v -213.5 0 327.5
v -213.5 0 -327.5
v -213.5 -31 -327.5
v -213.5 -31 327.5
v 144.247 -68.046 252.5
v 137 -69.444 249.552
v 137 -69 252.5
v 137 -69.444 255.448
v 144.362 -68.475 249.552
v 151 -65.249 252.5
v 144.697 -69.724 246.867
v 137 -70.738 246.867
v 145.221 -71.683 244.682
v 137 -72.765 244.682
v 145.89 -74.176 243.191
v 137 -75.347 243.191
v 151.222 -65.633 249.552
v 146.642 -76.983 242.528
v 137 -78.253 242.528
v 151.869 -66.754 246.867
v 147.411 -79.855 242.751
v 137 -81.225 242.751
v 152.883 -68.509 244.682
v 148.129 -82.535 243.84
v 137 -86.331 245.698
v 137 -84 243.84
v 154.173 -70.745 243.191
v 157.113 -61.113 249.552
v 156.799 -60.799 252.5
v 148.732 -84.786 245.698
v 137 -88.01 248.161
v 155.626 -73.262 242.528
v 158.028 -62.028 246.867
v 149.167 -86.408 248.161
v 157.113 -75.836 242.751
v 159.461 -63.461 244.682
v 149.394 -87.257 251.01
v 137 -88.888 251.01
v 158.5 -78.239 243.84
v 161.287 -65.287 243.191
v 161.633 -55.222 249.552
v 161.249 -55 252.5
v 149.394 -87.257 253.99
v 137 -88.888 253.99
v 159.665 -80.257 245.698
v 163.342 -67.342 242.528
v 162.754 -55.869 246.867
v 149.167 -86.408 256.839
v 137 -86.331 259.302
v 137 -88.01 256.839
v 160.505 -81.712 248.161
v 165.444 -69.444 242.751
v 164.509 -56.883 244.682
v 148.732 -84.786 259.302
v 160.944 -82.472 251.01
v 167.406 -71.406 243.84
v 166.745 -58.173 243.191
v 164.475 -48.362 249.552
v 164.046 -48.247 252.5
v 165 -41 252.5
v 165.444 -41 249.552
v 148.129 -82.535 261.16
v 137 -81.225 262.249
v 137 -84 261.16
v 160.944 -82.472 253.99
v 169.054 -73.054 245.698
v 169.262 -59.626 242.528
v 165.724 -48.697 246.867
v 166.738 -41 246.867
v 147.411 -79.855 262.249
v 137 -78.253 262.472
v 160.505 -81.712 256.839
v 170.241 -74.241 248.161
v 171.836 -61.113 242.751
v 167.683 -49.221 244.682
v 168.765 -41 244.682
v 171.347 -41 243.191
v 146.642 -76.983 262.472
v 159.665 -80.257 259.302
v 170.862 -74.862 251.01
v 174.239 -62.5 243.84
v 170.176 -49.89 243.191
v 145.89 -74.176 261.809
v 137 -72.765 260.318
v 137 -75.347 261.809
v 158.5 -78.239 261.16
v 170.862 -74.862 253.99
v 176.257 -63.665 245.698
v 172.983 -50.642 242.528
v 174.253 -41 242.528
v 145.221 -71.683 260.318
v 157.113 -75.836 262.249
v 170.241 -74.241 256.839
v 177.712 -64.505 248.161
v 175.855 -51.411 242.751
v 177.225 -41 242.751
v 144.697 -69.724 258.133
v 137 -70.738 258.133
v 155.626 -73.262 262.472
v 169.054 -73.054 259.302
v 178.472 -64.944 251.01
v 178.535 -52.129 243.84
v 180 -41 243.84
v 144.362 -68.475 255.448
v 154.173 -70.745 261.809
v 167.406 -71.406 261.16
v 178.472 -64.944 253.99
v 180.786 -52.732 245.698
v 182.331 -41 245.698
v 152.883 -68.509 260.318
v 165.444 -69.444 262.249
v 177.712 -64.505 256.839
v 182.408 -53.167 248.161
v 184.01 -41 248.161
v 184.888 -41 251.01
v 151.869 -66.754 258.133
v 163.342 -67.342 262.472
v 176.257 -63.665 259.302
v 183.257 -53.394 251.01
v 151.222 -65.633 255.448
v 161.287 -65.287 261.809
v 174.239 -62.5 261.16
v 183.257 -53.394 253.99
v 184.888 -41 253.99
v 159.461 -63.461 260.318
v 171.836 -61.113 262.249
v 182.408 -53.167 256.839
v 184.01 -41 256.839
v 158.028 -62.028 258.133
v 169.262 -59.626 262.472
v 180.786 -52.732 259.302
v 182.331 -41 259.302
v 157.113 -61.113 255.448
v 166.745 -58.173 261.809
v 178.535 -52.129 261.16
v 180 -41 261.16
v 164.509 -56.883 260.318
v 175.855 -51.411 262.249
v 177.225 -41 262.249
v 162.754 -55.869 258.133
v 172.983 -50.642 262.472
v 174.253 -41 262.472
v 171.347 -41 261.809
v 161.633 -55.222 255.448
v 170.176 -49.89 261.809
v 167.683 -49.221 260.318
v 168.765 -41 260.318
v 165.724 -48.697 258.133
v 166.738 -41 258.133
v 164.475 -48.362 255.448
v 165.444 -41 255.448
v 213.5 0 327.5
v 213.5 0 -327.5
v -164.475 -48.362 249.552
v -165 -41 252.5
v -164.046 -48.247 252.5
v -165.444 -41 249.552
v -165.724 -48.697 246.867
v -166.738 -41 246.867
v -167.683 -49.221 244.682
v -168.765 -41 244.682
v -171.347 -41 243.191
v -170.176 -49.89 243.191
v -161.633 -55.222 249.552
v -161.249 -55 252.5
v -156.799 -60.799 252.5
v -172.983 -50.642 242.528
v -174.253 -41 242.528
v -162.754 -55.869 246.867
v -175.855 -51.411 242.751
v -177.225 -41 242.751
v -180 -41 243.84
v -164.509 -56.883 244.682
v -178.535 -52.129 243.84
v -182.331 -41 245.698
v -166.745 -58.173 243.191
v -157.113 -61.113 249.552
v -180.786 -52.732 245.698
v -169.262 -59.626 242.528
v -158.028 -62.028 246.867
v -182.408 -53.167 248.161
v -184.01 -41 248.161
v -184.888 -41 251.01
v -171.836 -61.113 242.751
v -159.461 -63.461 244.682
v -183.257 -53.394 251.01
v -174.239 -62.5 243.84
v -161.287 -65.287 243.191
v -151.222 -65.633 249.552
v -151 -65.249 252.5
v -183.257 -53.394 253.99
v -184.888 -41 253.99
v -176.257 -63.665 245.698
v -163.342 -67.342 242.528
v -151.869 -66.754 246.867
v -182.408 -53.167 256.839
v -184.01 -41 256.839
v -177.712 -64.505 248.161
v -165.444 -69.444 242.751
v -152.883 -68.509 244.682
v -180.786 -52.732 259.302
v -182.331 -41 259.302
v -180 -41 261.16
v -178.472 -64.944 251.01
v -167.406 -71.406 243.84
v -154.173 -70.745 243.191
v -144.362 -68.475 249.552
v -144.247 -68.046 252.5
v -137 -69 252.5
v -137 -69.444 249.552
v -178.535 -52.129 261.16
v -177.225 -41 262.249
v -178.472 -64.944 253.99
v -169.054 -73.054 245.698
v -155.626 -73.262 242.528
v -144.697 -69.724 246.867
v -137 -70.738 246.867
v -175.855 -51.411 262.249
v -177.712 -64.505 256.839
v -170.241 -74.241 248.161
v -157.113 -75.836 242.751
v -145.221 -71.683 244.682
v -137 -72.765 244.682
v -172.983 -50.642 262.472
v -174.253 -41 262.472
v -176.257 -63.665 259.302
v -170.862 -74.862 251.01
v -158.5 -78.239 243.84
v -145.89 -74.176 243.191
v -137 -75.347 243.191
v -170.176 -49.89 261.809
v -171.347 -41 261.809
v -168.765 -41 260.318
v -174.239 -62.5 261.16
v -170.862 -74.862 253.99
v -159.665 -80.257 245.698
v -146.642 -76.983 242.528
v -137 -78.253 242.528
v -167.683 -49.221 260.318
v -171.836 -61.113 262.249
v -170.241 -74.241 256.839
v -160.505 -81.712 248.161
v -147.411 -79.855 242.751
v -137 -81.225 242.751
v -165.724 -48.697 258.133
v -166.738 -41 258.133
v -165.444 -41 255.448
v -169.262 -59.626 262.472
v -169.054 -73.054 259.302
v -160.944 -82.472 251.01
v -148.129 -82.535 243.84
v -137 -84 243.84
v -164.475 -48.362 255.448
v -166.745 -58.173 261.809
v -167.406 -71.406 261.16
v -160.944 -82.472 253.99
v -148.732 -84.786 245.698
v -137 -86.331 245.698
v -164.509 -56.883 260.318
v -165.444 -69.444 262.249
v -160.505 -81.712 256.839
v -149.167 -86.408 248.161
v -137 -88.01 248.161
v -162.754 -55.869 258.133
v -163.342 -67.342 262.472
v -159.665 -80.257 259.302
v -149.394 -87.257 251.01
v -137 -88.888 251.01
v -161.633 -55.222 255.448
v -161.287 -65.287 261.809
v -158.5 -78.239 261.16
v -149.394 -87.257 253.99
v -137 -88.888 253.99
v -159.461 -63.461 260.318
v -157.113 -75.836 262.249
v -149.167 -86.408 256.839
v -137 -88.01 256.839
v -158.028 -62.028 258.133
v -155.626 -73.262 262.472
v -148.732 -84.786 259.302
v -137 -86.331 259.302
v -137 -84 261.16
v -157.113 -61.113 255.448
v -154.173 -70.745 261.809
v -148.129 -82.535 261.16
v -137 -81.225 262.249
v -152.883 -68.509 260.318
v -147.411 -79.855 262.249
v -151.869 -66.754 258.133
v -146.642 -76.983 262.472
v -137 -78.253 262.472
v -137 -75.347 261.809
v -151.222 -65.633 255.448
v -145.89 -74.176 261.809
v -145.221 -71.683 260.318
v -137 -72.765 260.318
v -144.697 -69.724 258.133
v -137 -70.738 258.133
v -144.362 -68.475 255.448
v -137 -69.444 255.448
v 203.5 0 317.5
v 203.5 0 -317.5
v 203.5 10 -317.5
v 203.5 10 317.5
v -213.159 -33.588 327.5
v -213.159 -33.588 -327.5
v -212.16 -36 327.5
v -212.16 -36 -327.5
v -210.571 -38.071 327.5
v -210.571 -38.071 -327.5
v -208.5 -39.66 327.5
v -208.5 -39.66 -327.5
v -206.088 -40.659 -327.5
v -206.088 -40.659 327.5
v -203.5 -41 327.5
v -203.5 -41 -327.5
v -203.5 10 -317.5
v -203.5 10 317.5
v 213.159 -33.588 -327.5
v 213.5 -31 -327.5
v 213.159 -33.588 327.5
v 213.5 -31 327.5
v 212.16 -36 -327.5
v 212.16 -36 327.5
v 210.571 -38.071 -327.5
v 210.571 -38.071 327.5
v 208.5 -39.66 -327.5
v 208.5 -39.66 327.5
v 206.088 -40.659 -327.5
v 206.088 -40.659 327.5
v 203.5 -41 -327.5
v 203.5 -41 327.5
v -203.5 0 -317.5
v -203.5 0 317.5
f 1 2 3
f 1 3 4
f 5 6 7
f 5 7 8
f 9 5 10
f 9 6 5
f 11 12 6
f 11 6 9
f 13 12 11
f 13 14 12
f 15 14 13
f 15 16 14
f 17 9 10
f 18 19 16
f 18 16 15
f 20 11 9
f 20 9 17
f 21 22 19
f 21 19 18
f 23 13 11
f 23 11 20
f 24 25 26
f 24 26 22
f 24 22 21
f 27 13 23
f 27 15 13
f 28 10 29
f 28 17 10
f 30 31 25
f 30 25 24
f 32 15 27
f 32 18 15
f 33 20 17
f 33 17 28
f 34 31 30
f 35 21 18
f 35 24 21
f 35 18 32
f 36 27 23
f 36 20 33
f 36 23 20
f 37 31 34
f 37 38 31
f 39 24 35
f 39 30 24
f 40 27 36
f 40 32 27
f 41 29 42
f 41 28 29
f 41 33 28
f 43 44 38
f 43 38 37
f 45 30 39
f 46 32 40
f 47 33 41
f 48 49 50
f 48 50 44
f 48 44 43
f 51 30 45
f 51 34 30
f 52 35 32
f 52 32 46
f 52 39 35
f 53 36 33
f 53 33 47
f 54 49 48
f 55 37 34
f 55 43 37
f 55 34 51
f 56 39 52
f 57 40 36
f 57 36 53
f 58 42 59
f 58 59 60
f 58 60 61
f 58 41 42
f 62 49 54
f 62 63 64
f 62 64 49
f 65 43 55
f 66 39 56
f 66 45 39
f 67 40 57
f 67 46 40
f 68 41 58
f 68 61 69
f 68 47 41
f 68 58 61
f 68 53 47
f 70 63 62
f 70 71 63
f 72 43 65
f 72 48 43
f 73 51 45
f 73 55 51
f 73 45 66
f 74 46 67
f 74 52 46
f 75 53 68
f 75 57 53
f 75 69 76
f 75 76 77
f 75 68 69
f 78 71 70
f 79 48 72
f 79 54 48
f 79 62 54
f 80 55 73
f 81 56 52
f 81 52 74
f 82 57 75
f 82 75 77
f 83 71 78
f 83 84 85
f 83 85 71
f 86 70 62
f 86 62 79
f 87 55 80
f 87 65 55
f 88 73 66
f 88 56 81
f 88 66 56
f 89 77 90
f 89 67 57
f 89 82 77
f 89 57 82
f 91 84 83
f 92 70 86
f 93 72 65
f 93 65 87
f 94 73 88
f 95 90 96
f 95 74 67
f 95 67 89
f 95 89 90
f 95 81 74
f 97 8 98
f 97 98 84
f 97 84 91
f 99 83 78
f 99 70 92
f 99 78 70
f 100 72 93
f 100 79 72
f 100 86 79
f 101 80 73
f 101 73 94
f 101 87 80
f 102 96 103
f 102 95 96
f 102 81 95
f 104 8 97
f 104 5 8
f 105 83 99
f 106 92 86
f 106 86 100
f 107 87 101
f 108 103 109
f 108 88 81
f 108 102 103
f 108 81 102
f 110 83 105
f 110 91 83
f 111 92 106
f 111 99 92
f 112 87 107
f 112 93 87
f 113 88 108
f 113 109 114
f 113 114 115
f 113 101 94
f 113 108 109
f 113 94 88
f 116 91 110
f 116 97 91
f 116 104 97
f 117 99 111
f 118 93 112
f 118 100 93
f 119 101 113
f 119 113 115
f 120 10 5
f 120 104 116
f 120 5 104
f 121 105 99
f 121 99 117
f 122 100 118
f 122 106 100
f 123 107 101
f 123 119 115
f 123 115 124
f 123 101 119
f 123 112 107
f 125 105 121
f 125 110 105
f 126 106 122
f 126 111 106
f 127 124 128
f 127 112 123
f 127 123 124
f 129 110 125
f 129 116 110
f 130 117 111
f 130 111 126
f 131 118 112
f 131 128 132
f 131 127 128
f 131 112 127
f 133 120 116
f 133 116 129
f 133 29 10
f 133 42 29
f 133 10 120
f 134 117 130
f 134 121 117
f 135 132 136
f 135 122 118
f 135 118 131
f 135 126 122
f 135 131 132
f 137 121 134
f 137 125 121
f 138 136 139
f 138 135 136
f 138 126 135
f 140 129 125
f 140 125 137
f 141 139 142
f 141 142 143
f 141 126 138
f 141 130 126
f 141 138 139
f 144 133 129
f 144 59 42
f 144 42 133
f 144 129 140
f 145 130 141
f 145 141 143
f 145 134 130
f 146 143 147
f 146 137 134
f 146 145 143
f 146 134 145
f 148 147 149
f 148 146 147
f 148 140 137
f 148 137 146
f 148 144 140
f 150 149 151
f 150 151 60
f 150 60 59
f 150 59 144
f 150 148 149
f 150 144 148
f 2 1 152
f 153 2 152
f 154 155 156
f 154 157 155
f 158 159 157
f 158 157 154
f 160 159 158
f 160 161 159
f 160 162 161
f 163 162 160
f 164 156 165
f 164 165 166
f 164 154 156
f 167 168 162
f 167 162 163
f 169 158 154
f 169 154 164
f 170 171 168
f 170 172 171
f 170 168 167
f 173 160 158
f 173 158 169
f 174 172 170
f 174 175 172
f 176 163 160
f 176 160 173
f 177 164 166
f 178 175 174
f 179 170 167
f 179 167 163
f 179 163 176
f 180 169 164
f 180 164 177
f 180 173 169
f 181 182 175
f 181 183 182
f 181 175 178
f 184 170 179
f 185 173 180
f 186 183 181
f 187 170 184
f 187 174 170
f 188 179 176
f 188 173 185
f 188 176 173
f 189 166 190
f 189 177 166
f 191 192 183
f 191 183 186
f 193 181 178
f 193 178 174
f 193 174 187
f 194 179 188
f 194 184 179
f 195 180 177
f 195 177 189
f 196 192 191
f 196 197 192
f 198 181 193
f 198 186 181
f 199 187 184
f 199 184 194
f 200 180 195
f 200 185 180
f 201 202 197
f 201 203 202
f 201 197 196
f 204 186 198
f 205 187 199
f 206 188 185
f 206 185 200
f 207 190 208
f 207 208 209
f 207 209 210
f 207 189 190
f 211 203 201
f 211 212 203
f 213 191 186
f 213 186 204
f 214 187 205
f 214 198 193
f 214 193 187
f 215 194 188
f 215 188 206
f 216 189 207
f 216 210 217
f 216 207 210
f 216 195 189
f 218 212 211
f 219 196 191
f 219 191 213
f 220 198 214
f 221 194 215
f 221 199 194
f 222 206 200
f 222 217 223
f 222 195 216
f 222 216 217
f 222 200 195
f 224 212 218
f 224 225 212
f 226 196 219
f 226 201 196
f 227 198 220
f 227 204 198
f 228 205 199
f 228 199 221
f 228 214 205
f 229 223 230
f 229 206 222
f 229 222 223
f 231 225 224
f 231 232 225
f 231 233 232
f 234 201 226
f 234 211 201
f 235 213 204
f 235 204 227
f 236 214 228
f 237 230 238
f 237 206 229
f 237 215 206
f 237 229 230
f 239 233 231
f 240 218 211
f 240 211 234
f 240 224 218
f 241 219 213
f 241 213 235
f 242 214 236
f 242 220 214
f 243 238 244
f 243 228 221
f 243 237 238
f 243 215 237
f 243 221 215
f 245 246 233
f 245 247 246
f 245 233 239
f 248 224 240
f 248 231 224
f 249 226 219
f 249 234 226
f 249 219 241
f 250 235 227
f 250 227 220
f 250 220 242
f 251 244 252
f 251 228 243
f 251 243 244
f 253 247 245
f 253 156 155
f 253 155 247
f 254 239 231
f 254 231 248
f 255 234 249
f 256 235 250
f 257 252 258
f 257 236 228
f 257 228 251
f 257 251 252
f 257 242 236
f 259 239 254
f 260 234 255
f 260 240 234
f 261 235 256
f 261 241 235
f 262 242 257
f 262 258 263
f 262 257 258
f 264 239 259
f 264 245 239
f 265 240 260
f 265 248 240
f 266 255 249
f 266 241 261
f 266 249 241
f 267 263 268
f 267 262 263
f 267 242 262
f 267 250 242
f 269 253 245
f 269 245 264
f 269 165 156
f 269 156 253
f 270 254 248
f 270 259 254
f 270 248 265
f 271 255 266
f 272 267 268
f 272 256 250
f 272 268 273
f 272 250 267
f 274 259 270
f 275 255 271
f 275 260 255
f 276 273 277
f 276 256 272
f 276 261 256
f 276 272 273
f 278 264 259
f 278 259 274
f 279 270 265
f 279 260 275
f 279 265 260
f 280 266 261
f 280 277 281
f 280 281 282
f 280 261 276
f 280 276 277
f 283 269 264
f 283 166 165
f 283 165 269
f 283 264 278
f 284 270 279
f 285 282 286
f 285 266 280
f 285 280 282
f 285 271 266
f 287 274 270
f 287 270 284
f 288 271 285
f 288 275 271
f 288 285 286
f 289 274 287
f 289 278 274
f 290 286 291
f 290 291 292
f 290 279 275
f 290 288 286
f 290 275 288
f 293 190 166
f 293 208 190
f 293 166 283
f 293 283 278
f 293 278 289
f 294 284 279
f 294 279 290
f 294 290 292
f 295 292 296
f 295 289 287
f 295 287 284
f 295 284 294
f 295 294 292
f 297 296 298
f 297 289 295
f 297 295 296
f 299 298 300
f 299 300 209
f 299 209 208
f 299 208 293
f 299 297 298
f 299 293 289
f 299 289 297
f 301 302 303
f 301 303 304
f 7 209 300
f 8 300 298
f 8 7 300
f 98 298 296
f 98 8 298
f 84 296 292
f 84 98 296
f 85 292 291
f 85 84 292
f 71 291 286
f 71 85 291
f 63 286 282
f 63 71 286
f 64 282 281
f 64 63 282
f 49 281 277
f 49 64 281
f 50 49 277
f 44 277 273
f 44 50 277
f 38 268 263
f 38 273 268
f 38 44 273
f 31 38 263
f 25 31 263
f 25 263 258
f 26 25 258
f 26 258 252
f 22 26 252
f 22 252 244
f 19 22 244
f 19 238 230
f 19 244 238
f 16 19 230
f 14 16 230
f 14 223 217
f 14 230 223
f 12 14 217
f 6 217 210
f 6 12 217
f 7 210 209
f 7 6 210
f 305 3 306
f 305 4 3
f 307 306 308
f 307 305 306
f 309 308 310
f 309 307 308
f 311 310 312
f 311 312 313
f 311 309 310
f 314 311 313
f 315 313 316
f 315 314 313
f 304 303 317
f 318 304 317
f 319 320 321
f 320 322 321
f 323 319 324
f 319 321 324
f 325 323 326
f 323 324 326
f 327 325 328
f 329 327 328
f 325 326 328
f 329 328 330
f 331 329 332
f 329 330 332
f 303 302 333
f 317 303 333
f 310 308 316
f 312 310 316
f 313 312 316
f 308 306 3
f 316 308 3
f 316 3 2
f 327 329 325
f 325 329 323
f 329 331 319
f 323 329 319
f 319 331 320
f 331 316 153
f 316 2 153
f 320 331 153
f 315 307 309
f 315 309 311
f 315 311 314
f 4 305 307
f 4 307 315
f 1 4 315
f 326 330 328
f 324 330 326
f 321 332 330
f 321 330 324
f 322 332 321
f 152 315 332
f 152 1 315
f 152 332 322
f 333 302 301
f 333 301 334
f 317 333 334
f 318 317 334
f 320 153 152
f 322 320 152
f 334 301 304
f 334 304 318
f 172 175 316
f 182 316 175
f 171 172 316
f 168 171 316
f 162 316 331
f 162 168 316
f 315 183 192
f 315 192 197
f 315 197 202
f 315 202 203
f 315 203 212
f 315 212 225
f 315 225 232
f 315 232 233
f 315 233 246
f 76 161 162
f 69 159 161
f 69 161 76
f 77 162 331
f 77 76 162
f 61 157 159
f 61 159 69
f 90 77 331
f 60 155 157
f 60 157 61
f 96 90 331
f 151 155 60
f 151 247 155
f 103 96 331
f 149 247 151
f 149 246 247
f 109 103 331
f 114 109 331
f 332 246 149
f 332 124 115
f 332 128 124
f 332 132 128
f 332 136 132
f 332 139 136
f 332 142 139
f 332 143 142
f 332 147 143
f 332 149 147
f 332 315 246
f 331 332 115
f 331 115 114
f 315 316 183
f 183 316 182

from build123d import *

# Parameters (mm, degrees)
F0_W     = 427
F0_H     = 655
F1_DEPTH = 41
F2_R     = 10
F3_W     = 407
F3_H     = 635
F4_DEPTH = 10
F7_R     = 10


with BuildPart() as f1:
    # F0 (on Front) → F1 (new body)
    with BuildSketch(Plane.XZ):
        Rectangle(F0_W, F0_H)
    extrude(amount=F1_DEPTH)

    # F2
    f2_edges = [f1.edges().sort_by_distance(p)[0] for p in [
        (-213.5, -41, 0),
        (213.5, -41, 0),
    ]]
    fillet(f2_edges, radius=F2_R)

    # F8: sweep along a path in F6
    with BuildLine(Plane.XY.offset(252.5)) as f8_path:
        ThreePointArc((-175, -41), (-163.8700576851, -67.8700576851), (-137, -79))
        Line((-137, -79), (137, -79))
        ThreePointArc((137, -79), (163.8700576851, -67.8700576851), (175, -41))
    # F7 (on face) → F8 (sweep)
    with BuildSketch(Plane.XZ.offset(41)):
        with Locations((-175, 252.5)):
            Circle(F7_R)
    sweep(path=f8_path.line)


with BuildPart() as f4:
    # F3 (on face) → F4 (new body)
    with BuildSketch(Plane(origin=(0, 0, 0), x_dir=(-1, 0, 0), z_dir=(0, 1, 0))):
        Rectangle(F3_W, F3_H)
    extrude(amount=F4_DEPTH)


solid = Compound([f1.part, f4.part])
